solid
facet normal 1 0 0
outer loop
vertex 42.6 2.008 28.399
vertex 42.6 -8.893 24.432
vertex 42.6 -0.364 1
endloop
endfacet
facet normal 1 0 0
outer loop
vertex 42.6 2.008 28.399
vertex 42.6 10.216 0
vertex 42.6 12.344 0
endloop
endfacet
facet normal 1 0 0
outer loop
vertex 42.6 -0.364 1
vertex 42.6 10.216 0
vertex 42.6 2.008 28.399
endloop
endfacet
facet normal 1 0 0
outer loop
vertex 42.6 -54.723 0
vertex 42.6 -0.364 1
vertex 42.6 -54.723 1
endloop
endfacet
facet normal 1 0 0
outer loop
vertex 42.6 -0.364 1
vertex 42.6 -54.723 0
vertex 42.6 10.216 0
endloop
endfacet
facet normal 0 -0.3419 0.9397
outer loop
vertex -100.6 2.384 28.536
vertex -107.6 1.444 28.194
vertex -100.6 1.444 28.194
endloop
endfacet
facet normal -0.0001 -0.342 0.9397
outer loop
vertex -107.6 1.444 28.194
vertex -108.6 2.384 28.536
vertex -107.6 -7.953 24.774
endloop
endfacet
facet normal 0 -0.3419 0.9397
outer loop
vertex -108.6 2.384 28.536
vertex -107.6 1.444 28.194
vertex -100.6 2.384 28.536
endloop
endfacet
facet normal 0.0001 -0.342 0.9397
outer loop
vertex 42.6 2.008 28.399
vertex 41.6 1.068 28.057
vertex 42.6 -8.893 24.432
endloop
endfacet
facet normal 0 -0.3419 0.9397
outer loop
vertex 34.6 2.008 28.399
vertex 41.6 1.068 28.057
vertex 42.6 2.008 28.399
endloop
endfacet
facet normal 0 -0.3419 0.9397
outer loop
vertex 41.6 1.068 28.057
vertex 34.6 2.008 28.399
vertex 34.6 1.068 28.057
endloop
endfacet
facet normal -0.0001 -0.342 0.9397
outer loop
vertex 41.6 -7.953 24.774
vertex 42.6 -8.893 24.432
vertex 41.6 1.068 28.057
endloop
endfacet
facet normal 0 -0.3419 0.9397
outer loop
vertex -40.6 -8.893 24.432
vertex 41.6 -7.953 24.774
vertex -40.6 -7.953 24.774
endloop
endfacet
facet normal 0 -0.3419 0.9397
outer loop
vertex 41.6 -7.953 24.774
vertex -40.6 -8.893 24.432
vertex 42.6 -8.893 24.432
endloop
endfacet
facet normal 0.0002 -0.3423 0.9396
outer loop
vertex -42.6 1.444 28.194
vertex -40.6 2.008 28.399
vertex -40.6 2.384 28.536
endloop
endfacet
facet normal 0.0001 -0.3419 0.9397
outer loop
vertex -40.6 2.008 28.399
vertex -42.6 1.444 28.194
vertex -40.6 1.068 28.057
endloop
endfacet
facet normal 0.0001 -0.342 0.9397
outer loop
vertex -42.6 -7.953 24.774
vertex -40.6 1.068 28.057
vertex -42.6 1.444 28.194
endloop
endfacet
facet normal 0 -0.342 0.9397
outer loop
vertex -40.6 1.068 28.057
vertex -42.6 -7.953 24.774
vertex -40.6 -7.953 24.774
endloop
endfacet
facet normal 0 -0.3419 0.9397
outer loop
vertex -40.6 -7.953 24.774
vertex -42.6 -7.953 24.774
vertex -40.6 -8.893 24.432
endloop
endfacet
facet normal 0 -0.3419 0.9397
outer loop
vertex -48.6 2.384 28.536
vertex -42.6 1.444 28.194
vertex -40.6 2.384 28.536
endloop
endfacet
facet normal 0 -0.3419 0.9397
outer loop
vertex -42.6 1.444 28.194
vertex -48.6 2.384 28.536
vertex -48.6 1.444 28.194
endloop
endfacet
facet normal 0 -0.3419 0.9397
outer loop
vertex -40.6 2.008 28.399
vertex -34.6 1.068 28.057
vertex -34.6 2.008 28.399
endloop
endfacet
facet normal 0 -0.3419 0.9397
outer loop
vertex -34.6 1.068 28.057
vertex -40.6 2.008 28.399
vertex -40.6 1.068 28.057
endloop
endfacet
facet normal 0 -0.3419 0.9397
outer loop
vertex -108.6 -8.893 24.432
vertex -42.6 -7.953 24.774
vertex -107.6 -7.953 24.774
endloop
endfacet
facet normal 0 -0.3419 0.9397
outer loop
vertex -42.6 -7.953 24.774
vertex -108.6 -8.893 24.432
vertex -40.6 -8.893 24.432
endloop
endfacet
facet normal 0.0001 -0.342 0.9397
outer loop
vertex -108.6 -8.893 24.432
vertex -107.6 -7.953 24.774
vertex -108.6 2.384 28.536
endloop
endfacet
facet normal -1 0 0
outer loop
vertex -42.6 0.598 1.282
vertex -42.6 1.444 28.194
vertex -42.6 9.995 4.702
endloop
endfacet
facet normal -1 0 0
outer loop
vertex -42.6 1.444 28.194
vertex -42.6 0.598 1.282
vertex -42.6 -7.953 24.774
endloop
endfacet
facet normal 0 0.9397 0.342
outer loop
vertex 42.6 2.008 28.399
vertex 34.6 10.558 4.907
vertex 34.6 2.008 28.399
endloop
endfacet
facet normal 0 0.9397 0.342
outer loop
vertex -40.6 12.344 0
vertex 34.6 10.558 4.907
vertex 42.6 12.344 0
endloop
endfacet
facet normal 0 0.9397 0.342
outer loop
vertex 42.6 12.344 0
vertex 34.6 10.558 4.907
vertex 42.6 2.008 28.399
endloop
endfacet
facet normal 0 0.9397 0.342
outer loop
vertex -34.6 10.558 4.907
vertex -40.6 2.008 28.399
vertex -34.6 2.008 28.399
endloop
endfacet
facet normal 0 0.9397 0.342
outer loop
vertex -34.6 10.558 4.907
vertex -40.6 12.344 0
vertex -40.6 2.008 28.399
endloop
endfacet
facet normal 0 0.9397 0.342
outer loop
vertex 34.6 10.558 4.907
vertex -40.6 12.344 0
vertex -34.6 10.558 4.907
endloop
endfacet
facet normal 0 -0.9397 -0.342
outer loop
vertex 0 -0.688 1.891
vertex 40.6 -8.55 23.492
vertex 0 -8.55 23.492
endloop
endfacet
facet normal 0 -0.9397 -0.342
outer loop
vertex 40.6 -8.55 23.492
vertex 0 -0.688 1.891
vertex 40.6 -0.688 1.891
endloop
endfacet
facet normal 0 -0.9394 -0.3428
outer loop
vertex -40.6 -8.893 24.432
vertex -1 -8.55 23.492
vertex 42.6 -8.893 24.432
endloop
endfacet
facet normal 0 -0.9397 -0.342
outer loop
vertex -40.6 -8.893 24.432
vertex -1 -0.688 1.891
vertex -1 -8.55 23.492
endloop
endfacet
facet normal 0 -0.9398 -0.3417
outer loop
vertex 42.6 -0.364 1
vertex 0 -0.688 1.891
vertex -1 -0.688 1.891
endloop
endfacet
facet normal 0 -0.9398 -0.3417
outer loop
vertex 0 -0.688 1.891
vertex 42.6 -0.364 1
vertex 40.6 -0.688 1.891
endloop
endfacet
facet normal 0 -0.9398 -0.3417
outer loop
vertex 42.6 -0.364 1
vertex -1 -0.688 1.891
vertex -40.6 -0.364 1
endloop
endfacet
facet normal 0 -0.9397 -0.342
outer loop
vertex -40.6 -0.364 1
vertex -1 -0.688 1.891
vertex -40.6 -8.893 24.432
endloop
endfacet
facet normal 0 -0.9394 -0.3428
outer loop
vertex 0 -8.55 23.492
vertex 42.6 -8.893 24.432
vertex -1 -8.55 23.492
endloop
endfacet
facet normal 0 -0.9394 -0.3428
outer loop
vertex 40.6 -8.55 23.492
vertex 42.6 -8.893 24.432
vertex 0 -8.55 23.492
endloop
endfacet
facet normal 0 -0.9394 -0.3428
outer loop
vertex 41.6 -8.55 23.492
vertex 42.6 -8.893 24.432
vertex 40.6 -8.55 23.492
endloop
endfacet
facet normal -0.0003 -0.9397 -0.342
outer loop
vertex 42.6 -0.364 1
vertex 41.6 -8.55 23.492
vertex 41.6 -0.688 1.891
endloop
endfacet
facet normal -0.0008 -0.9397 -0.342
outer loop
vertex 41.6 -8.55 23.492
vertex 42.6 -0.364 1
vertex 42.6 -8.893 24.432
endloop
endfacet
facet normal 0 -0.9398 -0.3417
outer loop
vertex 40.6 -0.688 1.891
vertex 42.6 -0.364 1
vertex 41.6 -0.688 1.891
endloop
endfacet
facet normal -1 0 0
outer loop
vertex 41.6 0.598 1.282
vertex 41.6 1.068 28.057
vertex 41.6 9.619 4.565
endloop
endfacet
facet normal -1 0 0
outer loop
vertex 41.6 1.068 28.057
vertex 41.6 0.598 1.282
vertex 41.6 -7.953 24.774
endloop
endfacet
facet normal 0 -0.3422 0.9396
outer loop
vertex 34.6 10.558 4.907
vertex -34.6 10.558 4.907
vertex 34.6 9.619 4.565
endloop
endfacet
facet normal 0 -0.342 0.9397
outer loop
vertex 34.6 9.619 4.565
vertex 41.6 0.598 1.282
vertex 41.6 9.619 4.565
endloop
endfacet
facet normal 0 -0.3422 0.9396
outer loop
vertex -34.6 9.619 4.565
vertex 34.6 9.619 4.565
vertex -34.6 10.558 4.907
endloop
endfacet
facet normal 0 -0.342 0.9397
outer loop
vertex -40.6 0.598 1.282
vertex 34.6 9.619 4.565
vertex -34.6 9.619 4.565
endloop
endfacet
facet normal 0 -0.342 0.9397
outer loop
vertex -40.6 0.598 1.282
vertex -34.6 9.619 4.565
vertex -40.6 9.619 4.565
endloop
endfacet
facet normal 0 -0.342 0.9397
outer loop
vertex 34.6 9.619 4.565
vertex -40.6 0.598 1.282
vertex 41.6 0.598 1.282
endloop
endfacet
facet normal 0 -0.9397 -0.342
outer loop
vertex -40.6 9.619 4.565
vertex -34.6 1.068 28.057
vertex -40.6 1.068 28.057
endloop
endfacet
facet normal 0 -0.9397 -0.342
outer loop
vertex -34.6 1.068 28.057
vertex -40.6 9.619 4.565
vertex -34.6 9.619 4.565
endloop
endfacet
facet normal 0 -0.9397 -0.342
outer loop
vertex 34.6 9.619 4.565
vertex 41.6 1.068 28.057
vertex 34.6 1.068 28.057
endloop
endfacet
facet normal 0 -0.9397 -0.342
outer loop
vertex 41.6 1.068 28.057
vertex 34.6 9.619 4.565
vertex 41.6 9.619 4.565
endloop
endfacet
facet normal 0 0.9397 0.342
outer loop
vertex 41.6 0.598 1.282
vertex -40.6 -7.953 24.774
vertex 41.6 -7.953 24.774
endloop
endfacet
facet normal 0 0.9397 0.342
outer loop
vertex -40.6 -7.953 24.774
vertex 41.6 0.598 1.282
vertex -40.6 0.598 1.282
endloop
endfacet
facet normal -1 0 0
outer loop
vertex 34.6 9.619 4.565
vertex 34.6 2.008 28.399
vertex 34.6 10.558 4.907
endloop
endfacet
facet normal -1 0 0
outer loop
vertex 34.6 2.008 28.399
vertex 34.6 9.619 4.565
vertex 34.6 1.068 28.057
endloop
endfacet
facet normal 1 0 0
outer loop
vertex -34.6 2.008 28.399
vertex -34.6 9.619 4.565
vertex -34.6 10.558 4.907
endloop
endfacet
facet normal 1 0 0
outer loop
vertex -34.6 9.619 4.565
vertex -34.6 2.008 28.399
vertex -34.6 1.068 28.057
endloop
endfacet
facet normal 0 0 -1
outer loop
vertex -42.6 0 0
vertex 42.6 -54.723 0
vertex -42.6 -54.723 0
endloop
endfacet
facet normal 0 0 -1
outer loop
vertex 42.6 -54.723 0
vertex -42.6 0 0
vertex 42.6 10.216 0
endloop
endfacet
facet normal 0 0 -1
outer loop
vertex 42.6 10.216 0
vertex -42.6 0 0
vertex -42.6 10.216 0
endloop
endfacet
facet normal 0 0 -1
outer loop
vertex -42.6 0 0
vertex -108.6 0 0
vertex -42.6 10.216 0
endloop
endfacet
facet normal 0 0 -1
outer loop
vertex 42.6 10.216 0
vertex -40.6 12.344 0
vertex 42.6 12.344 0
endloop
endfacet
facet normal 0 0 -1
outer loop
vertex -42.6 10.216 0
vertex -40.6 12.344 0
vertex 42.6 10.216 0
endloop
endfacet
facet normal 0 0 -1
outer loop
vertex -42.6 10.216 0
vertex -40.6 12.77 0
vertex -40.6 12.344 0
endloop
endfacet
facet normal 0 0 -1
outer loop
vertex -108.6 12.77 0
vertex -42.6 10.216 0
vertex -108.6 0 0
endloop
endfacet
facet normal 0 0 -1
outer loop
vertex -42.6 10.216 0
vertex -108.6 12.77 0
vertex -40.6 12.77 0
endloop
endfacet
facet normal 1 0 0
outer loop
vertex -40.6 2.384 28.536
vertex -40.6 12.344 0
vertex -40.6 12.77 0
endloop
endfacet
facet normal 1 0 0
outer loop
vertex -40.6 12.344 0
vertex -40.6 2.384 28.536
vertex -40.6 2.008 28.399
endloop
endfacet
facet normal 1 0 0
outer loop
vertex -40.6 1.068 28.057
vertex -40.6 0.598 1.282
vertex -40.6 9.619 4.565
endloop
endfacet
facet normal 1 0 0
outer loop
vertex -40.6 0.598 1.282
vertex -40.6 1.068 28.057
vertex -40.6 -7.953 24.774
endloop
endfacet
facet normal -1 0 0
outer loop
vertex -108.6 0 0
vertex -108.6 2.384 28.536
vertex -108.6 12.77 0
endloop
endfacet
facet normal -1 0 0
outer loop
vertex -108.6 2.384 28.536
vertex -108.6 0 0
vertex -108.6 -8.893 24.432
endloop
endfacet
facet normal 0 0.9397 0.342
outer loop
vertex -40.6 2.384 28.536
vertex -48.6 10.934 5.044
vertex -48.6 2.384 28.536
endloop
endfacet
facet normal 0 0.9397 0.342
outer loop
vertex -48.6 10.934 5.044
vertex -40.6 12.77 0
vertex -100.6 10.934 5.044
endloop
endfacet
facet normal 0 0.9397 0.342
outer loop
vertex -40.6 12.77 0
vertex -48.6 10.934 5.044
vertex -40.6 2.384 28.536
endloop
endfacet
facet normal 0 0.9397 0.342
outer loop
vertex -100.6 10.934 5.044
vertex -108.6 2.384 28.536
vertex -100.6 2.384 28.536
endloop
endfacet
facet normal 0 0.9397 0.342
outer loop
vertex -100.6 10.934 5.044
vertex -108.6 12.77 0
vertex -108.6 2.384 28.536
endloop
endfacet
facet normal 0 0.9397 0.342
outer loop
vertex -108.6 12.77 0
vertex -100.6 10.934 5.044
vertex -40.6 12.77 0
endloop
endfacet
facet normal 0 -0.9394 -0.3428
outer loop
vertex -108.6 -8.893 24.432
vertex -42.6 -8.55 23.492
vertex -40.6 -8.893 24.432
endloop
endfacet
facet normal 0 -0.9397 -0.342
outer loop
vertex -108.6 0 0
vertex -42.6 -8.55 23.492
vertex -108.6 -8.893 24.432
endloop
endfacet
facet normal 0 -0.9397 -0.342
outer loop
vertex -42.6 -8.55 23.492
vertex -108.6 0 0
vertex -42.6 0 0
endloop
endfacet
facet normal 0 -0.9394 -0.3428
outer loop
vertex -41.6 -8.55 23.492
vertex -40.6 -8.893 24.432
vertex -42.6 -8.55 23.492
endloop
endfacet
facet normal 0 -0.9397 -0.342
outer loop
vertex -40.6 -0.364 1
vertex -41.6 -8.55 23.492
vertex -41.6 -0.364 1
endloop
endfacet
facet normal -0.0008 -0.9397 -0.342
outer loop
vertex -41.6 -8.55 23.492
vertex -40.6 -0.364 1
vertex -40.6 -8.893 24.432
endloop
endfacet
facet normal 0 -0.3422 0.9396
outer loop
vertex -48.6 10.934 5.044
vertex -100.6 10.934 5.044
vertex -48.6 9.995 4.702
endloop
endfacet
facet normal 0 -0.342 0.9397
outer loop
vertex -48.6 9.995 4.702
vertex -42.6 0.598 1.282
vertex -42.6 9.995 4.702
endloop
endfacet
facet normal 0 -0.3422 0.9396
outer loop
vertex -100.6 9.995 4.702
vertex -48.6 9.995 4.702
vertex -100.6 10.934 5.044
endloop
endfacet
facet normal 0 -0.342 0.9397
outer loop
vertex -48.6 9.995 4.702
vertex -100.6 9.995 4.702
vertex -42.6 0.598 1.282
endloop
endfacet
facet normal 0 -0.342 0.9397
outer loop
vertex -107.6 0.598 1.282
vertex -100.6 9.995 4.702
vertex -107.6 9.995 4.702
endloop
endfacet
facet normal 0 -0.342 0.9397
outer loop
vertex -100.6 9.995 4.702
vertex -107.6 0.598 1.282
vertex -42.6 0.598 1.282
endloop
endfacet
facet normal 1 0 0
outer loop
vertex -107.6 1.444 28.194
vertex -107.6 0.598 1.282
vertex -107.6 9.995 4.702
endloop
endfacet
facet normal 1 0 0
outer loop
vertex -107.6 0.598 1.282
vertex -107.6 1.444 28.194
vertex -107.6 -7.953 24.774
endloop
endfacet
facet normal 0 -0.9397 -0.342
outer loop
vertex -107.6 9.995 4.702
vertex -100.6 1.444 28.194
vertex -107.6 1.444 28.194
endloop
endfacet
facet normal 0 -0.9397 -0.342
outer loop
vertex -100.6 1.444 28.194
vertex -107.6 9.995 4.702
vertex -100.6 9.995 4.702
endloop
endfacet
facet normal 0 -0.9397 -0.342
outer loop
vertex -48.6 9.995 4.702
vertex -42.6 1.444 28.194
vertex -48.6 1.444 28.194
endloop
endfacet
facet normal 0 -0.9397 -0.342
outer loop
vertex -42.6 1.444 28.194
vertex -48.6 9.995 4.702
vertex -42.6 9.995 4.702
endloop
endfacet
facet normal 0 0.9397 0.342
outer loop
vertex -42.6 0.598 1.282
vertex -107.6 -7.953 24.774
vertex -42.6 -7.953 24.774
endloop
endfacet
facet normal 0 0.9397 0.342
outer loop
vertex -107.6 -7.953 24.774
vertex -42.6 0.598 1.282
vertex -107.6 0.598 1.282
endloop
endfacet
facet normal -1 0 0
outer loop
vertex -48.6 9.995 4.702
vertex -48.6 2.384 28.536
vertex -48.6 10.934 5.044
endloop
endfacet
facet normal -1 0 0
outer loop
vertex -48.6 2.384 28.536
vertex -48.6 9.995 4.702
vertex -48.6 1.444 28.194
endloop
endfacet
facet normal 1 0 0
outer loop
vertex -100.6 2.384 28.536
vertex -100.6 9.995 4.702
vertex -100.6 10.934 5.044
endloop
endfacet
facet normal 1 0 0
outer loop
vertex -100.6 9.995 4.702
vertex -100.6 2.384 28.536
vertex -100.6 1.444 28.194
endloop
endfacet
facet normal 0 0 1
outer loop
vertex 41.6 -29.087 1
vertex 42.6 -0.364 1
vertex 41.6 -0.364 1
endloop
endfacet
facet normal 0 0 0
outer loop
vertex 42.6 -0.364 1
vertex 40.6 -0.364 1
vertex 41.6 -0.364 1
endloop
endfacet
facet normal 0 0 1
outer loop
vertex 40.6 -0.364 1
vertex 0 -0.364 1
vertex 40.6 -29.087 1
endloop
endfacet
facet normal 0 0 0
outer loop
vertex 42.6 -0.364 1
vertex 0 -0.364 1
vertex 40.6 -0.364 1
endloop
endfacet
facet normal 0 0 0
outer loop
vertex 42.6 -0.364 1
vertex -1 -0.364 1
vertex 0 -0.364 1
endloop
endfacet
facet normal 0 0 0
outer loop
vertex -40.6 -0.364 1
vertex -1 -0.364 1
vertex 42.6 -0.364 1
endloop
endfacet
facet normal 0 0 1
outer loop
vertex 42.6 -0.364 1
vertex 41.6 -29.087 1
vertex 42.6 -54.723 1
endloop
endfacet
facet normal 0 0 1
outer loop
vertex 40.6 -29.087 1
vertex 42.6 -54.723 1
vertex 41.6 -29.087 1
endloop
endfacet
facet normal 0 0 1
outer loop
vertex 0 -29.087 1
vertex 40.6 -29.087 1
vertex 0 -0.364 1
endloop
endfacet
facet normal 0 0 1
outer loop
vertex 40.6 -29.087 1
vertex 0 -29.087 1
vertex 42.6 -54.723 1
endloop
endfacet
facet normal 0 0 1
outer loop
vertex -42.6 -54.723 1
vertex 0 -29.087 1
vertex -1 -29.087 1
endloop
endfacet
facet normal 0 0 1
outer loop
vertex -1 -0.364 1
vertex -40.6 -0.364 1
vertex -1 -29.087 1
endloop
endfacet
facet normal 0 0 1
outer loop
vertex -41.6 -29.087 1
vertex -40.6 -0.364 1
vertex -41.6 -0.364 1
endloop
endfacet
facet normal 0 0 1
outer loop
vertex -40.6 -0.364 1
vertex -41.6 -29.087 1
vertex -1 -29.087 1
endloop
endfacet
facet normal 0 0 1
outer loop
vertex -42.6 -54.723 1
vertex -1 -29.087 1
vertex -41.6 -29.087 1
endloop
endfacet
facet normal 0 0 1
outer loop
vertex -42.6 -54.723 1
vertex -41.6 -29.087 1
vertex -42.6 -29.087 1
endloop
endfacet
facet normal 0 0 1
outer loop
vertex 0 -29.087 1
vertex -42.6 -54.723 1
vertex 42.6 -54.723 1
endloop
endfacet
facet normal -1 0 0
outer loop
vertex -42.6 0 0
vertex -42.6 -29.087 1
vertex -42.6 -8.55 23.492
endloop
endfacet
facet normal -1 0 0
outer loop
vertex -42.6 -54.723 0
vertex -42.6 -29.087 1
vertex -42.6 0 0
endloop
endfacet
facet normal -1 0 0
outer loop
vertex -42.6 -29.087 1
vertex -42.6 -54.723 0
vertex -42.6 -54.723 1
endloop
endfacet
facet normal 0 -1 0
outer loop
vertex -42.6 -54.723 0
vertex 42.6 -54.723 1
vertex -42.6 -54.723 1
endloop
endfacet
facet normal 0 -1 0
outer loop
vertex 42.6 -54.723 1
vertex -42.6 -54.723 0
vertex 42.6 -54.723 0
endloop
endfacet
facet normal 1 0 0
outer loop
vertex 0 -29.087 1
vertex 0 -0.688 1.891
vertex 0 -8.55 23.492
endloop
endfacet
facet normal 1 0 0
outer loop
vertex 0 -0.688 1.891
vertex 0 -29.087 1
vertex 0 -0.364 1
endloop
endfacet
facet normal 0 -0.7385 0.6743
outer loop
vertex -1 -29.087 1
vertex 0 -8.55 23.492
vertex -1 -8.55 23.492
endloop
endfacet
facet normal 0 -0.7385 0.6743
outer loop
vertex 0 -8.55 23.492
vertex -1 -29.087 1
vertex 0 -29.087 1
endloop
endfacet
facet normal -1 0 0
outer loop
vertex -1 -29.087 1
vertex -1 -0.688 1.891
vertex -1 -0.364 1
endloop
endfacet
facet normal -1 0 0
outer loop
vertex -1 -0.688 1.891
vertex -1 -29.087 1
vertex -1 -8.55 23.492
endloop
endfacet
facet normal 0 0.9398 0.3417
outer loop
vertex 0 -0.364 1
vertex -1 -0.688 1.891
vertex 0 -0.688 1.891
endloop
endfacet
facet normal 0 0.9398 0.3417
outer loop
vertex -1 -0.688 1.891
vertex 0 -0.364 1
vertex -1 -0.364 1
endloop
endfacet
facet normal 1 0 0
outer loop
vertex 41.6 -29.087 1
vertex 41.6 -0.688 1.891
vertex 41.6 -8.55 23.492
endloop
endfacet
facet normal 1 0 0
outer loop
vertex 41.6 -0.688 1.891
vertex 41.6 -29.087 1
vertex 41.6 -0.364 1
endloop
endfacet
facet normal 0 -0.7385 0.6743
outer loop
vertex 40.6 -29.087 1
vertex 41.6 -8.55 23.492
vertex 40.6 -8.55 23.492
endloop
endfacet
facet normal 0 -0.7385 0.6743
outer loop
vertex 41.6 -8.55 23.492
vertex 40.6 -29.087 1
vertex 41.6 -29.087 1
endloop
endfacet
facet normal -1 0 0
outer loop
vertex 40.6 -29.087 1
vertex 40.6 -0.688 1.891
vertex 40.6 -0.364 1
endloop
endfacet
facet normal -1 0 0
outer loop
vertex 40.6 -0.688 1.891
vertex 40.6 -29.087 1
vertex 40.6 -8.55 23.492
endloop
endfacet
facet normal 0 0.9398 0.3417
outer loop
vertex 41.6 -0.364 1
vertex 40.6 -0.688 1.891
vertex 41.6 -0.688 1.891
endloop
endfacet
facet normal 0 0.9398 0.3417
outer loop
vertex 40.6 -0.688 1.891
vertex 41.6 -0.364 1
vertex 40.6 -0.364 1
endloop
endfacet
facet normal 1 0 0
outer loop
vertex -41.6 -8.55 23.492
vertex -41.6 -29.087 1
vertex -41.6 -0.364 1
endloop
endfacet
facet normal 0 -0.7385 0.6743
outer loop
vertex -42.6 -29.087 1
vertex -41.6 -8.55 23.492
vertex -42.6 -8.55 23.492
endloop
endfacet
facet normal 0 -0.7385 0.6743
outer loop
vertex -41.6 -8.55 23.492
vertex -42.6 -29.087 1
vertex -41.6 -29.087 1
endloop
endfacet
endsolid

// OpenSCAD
px = 83.2;
py = 9.6;
pz = 25;
p_overhang = 7;
base = 100;

phone_h = 160;

angle = 20;

t = 1;

module slanted_slot(
    px=px, py=py, pz=pz,
    p_overhang=p_overhang,
    angle=angle, base=base
){
    difference(){
        rotate([angle, 0, 0])
        translate([0, (py + 2*t)/2, (pz + t)/2])
        difference(){
            translate([0, 0, -base/2])
            cube([px + 2*t, py + 2*t, pz + t + base], center=true);
            translate([0, 0, t/2])
            cube([px, py, pz], center=true);
            translate([0, t, t/2])
            cube([px - 2*p_overhang, py, pz], center=true);
        }
        translate([0, 0, -base/2])
        cube([base, base, base], center=true);
    }
}

slanted_slot();
translate([-(px + 2*t)/2, -phone_h*sin(angle), 0])
cube([px + 2*t, py/cos(angle) + phone_h*sin(angle), t]);

module rib(){
    rotate([0, 0, -90])
    rotate([90, 0, 0])
    linear_extrude(height=t){
    polygon([
        [0, 0],
        [pz * sin(angle), pz * cos(angle)],
        [30, 0]
    ]);
    }
}
rib();
translate([px/2, 0, 0])
rib();
translate([-px/2, 0, 0])
rib();

sqx = 66;
sqy = 10;

translate([-(px + sqx)/2, 0, 0])
slanted_slot(px=sqx, py=sqy, pz=pz);
